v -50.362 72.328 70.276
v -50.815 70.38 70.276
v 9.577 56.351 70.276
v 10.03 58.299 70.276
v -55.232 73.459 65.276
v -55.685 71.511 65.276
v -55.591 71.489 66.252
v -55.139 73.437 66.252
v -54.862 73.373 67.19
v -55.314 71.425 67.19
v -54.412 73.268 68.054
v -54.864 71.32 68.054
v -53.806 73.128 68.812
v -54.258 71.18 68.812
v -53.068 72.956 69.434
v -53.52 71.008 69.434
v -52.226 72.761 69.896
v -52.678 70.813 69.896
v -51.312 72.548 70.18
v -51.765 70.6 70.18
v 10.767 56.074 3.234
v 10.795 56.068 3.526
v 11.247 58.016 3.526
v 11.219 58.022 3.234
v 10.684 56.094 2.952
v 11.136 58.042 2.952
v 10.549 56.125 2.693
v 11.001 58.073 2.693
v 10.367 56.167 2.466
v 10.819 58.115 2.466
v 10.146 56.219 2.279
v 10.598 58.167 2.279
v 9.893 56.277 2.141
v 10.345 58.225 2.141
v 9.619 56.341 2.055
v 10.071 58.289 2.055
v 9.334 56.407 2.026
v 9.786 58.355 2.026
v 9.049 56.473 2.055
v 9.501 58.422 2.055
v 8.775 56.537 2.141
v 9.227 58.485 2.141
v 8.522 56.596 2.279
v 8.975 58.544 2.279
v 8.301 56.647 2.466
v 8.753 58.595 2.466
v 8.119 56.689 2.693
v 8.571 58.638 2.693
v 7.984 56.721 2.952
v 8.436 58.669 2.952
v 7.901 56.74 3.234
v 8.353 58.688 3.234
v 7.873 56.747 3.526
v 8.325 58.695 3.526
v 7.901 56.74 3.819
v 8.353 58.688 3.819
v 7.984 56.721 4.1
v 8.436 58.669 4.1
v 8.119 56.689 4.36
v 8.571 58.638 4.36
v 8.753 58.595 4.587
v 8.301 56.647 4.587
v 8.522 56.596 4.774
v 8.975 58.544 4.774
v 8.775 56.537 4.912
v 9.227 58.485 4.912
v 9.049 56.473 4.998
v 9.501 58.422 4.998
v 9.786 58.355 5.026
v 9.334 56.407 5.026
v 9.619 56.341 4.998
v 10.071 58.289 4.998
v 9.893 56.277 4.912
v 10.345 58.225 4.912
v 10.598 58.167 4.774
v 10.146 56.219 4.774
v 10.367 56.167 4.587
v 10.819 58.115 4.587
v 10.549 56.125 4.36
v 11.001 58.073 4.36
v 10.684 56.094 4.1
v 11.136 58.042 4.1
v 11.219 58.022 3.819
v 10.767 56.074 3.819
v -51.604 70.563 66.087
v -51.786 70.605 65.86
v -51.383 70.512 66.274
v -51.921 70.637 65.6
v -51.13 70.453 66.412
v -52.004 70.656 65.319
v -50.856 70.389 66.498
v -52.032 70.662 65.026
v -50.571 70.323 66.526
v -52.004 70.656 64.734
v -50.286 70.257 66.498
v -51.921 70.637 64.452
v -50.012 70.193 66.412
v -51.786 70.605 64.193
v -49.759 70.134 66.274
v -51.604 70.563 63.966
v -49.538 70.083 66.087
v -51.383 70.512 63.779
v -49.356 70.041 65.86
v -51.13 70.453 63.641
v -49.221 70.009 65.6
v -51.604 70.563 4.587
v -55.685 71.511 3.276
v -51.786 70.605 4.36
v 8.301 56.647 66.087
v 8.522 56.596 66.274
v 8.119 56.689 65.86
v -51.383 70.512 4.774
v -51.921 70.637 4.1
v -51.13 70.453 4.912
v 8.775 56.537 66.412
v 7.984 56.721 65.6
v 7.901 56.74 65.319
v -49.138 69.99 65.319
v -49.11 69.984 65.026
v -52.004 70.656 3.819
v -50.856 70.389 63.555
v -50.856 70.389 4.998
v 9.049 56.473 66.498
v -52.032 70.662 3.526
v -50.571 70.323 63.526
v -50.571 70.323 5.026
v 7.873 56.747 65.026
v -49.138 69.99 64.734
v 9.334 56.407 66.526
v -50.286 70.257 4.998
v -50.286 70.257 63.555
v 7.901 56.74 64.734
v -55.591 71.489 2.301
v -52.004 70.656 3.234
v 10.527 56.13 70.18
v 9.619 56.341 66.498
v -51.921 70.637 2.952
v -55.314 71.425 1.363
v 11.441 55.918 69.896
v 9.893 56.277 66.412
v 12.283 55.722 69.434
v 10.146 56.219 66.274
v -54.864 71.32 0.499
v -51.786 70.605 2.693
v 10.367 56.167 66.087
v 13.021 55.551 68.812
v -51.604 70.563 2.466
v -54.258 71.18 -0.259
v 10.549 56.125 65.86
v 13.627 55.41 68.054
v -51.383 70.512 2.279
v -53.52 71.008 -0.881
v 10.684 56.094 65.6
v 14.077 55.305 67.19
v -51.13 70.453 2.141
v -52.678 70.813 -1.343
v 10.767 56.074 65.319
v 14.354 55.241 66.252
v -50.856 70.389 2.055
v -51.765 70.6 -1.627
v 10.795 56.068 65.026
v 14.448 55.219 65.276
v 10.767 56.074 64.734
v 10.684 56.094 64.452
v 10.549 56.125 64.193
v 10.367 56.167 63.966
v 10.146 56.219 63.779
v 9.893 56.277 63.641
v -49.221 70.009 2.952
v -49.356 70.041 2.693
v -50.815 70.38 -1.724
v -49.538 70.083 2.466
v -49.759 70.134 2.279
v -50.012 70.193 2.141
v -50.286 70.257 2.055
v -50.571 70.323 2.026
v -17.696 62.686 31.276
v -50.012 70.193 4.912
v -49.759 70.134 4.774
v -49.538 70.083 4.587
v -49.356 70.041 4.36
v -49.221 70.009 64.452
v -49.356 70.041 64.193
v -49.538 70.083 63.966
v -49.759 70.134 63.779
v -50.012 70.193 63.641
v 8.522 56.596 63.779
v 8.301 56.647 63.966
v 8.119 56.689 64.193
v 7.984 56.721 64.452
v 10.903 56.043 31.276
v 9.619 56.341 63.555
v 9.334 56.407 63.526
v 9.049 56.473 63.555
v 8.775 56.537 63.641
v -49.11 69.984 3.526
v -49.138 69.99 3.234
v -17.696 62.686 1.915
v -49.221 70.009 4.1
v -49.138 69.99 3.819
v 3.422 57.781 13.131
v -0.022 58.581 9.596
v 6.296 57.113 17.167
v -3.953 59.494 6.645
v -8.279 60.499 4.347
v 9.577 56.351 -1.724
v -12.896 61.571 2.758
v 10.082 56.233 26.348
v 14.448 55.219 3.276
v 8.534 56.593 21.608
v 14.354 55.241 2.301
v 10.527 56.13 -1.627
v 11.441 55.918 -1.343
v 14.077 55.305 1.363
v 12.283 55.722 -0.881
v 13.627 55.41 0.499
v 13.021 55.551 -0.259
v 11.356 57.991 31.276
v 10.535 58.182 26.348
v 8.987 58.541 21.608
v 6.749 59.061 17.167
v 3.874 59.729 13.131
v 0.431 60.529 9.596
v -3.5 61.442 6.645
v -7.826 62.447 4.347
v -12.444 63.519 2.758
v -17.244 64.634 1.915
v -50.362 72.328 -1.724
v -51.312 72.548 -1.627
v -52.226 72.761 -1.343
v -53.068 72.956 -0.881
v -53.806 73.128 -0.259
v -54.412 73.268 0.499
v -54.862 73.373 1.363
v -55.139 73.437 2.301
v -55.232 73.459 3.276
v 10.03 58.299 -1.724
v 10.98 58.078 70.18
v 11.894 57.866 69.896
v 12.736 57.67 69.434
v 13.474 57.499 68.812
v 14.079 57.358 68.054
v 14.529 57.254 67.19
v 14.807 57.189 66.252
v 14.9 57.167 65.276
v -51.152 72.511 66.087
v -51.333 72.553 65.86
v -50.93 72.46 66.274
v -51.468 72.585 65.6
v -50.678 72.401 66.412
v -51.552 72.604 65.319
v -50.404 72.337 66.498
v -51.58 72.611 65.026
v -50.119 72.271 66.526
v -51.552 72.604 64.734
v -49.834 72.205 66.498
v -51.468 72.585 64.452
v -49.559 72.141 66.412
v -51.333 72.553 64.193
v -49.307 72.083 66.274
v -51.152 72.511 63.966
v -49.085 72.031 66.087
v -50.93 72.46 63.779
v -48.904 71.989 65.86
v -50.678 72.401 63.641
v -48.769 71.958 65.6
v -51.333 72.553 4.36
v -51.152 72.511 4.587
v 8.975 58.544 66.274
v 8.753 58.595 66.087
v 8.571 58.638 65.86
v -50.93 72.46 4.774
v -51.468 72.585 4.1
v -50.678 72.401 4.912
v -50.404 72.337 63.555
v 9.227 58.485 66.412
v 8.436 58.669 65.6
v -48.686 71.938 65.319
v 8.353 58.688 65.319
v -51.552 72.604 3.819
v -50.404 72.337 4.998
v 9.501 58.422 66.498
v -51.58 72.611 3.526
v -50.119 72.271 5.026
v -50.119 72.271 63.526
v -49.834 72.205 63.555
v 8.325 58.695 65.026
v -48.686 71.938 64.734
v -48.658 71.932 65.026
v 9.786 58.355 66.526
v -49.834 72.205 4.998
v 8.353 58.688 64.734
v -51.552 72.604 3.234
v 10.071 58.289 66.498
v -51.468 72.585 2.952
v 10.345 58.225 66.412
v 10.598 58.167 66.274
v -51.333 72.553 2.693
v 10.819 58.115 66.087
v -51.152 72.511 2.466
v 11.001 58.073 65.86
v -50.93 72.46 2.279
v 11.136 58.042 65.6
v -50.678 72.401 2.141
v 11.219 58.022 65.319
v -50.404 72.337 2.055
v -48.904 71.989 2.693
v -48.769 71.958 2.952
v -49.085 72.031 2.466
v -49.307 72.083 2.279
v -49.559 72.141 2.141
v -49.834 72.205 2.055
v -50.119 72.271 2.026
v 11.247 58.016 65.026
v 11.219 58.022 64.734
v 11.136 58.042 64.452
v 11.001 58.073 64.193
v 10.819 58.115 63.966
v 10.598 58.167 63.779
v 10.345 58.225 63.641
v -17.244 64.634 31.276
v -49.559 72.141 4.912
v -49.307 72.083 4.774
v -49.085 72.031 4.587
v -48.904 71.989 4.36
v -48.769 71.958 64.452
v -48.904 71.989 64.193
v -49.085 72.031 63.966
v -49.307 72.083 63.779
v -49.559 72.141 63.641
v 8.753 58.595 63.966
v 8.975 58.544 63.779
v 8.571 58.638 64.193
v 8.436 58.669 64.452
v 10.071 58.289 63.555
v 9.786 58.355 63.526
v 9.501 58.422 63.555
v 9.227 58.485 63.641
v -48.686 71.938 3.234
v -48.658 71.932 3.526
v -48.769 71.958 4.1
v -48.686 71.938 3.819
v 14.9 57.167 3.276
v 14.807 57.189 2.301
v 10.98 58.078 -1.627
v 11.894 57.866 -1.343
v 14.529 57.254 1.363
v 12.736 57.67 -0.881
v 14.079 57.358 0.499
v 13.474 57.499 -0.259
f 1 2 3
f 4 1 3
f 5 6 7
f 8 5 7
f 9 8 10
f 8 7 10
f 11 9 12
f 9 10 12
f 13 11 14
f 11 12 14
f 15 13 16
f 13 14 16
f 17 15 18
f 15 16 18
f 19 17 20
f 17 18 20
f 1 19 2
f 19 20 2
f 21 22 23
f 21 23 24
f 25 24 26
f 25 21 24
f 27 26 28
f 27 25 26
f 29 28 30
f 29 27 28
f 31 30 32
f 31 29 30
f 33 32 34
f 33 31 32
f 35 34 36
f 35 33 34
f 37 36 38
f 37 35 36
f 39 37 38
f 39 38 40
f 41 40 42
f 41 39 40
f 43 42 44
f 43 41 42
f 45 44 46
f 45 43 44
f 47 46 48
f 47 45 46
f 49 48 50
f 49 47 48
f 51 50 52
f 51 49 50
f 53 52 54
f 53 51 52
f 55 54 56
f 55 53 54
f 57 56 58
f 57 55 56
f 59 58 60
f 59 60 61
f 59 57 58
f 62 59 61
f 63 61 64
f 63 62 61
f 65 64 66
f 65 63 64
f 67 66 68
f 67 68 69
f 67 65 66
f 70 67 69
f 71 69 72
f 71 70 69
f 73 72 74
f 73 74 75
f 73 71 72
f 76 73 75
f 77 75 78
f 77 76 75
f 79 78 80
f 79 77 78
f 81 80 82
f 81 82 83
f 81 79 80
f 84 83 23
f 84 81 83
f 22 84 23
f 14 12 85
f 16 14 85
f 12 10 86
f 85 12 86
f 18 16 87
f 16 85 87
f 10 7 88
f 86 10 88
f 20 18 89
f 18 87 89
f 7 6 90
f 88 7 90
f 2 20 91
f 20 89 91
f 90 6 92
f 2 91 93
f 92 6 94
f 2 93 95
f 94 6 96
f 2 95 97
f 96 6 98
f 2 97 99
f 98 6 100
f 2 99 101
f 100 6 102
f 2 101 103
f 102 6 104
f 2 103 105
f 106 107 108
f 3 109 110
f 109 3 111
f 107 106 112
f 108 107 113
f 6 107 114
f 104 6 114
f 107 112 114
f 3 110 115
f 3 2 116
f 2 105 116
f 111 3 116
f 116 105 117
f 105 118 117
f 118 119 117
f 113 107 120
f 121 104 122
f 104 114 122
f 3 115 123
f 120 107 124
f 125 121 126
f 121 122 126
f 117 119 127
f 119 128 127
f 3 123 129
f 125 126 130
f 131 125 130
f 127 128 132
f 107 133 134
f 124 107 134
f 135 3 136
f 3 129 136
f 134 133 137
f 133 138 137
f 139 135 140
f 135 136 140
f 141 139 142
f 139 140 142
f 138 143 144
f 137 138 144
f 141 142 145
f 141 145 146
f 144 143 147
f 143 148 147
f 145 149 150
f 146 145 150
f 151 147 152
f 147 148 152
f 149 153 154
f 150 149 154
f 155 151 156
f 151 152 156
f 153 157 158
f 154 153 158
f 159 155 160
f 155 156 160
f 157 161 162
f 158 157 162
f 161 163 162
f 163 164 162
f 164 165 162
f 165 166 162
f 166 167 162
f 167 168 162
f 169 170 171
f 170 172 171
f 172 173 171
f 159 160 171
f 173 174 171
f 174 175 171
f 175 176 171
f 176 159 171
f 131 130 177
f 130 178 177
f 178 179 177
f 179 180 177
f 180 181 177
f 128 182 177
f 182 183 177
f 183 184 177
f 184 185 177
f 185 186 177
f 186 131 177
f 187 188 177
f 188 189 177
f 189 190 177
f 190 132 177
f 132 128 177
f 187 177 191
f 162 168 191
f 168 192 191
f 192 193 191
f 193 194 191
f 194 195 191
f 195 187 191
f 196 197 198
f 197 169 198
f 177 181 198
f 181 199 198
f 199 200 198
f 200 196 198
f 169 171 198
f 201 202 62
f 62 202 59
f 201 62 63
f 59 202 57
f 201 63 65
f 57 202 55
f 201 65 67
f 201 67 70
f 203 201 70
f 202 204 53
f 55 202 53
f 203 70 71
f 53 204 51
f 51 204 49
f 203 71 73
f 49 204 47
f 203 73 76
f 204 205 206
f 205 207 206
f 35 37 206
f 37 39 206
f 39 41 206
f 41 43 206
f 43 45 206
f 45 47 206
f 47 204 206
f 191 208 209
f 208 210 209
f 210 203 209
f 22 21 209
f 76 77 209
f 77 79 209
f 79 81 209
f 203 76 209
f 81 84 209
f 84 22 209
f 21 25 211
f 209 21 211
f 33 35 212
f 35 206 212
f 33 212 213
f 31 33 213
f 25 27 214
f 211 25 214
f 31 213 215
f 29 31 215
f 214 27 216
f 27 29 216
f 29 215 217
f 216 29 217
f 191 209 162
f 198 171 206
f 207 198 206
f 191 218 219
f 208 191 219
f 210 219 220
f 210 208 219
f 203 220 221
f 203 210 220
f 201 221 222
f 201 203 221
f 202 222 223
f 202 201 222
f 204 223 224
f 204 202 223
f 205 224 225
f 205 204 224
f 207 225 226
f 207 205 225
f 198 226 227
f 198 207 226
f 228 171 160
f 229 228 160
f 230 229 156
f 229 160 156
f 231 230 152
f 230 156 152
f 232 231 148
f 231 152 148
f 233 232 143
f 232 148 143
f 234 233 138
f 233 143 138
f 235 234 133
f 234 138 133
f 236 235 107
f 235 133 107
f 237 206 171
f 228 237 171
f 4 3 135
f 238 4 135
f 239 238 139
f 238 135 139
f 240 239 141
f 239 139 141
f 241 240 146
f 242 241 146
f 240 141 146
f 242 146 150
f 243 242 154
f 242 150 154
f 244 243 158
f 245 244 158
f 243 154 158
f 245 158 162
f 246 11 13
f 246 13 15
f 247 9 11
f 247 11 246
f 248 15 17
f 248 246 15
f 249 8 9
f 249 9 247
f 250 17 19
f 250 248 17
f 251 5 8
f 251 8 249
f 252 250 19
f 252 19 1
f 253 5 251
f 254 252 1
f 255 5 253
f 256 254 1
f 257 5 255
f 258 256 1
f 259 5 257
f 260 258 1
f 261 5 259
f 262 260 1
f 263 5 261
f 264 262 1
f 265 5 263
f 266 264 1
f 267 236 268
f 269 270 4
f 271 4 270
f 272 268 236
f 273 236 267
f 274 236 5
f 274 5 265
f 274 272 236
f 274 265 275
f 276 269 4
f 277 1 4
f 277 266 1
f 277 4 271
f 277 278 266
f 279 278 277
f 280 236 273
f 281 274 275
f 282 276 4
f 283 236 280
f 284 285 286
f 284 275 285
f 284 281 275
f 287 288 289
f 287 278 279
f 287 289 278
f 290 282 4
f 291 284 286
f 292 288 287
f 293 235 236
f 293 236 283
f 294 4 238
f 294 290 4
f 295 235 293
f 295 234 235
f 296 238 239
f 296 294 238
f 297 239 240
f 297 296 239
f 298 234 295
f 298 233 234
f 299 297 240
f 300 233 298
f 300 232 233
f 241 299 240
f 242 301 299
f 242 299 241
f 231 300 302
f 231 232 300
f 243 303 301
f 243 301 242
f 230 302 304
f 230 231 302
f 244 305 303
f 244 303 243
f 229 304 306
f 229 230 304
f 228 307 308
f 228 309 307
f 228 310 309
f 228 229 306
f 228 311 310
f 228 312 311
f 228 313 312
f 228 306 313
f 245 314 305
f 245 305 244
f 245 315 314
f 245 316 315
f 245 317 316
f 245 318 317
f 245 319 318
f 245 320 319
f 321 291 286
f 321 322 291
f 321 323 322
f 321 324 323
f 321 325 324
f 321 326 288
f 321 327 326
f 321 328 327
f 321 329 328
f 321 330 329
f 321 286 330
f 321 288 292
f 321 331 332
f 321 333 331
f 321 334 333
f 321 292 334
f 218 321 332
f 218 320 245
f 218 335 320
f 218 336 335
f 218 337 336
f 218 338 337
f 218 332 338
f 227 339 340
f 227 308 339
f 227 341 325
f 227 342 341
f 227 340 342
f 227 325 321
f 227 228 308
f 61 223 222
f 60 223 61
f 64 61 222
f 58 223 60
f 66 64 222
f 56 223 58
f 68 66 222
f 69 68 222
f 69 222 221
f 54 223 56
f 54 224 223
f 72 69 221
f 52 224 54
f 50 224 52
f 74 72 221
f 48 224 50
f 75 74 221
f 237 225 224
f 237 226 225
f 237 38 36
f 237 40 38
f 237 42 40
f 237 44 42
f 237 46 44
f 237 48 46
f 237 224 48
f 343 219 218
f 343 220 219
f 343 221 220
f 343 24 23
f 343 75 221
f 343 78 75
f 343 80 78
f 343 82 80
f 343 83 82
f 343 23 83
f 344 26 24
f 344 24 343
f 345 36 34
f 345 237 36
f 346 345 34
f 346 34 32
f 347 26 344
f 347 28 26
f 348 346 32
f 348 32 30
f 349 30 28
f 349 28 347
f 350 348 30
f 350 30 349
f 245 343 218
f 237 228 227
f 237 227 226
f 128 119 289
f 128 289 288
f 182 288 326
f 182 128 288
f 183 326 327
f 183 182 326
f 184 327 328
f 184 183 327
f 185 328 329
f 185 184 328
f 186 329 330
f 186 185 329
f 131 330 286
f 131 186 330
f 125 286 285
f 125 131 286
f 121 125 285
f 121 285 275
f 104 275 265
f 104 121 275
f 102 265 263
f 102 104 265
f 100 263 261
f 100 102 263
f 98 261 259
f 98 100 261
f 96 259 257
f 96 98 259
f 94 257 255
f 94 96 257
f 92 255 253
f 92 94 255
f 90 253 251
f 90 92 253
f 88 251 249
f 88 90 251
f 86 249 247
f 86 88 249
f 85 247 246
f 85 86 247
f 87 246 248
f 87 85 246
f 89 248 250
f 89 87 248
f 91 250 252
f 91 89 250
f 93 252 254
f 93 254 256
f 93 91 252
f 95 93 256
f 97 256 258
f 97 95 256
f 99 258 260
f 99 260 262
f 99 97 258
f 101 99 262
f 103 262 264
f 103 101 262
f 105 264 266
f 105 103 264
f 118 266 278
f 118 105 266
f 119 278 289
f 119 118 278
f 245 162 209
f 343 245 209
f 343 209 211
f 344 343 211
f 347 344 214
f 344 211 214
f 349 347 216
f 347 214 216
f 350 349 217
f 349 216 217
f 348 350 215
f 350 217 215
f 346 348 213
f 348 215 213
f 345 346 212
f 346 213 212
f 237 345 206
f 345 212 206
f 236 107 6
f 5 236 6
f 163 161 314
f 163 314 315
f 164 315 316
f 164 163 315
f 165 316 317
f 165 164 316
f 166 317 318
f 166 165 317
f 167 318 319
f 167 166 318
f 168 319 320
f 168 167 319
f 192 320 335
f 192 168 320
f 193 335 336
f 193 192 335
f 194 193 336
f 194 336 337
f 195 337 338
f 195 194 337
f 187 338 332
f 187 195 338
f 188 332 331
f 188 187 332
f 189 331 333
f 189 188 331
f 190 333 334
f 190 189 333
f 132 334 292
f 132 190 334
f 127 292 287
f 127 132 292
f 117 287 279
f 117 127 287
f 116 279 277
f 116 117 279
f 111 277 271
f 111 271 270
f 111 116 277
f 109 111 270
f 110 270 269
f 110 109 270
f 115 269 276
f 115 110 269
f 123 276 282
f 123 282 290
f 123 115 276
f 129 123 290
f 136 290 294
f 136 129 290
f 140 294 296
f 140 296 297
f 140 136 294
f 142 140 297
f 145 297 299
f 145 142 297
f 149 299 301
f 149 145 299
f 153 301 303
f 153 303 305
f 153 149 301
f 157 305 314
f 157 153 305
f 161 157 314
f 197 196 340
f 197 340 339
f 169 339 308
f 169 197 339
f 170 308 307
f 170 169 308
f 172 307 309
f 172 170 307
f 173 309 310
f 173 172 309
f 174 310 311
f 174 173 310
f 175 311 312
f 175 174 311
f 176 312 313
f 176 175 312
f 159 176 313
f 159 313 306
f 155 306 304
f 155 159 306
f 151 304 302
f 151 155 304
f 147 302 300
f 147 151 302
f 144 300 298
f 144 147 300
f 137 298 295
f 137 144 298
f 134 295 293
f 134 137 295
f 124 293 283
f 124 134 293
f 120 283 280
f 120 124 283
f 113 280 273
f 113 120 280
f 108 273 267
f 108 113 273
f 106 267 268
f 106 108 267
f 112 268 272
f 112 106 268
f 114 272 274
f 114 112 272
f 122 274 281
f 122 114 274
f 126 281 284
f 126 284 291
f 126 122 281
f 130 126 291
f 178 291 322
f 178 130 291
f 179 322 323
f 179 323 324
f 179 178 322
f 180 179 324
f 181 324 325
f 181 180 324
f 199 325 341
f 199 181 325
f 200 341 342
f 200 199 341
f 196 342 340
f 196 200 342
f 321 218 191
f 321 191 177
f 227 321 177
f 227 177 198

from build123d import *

# Parameters (mm, degrees)
SKETCH1_R           = 1.5
SKETCH1_R_2         = 32.5
BOSS_EXTRUDE1_DEPTH = 2
BOSS_EXTRUDE2_DEPTH = 2


with BuildPart() as part:
    # Sketch1 → Boss-Extrude1 (new body)
    with BuildSketch(Plane(origin=(12.910322113, 55.576390481, 0), x_dir=(0.974063756, -0.226273724, 0), z_dir=(0.226273724, 0.974063756, 0))):
        with BuildLine():
            Line((-65.421780539, -70.276441512), (-3.421780539, -70.276441512))
            ThreePointArc((-3.421780539, -70.276441512), (0.113753366, -68.811975418), (1.578219461, -65.276441512))
            Line((1.578219461, -65.276441512), (1.578219461, -3.276441512))
            ThreePointArc((1.578219461, -3.276441512), (0.113753366, 0.259092394), (-3.421780539, 1.723558488))
            Line((-3.421780539, 1.723558488), (-65.421780539, 1.723558488))
            ThreePointArc((-65.421780539, 1.723558488), (-68.957314445, 0.259092394), (-70.421780539, -3.276441512))
            Line((-70.421780539, -3.276441512), (-70.421780539, -65.276441512))
            ThreePointArc((-70.421780539, -65.276441512), (-68.957314445, -68.811975418), (-65.421780539, -70.276441512))
        make_face()
        with Locations((-65.171780539, -3.526441512)):
            Circle(SKETCH1_R, mode=Mode.SUBTRACT)
        with Locations((-65.171780539, -65.026441512)):
            Circle(SKETCH1_R, mode=Mode.SUBTRACT)
        with Locations((-3.671780539, -65.026441512)):
            Circle(SKETCH1_R, mode=Mode.SUBTRACT)
        with Locations((-3.671780539, -3.526441512)):
            Circle(SKETCH1_R, mode=Mode.SUBTRACT)
        with Locations((-34.421780539, -34.276441512)):
            Circle(SKETCH1_R_2, mode=Mode.SUBTRACT)
    extrude(amount=BOSS_EXTRUDE1_DEPTH)

    # Sketch2 → Boss-Extrude2 (add)
    with BuildSketch(Plane(origin=(13.362869562, 57.524517994, 0), x_dir=(0.974063756, -0.226273724, 0), z_dir=(0.226273724, 0.974063756, 0))):
        with BuildLine():
            Line((-2.060538289, -31.276441512), (-31.421780539, -31.276441512))
            Line((-31.421780539, -31.276441512), (-31.421780539, -1.915199262))
            ThreePointArc((-31.421780539, -1.915199262), (-57.402750928, -57.257411901), (-2.060538289, -31.276441512))
        make_face()
    extrude(amount=-BOSS_EXTRUDE2_DEPTH)


solid = part.part
